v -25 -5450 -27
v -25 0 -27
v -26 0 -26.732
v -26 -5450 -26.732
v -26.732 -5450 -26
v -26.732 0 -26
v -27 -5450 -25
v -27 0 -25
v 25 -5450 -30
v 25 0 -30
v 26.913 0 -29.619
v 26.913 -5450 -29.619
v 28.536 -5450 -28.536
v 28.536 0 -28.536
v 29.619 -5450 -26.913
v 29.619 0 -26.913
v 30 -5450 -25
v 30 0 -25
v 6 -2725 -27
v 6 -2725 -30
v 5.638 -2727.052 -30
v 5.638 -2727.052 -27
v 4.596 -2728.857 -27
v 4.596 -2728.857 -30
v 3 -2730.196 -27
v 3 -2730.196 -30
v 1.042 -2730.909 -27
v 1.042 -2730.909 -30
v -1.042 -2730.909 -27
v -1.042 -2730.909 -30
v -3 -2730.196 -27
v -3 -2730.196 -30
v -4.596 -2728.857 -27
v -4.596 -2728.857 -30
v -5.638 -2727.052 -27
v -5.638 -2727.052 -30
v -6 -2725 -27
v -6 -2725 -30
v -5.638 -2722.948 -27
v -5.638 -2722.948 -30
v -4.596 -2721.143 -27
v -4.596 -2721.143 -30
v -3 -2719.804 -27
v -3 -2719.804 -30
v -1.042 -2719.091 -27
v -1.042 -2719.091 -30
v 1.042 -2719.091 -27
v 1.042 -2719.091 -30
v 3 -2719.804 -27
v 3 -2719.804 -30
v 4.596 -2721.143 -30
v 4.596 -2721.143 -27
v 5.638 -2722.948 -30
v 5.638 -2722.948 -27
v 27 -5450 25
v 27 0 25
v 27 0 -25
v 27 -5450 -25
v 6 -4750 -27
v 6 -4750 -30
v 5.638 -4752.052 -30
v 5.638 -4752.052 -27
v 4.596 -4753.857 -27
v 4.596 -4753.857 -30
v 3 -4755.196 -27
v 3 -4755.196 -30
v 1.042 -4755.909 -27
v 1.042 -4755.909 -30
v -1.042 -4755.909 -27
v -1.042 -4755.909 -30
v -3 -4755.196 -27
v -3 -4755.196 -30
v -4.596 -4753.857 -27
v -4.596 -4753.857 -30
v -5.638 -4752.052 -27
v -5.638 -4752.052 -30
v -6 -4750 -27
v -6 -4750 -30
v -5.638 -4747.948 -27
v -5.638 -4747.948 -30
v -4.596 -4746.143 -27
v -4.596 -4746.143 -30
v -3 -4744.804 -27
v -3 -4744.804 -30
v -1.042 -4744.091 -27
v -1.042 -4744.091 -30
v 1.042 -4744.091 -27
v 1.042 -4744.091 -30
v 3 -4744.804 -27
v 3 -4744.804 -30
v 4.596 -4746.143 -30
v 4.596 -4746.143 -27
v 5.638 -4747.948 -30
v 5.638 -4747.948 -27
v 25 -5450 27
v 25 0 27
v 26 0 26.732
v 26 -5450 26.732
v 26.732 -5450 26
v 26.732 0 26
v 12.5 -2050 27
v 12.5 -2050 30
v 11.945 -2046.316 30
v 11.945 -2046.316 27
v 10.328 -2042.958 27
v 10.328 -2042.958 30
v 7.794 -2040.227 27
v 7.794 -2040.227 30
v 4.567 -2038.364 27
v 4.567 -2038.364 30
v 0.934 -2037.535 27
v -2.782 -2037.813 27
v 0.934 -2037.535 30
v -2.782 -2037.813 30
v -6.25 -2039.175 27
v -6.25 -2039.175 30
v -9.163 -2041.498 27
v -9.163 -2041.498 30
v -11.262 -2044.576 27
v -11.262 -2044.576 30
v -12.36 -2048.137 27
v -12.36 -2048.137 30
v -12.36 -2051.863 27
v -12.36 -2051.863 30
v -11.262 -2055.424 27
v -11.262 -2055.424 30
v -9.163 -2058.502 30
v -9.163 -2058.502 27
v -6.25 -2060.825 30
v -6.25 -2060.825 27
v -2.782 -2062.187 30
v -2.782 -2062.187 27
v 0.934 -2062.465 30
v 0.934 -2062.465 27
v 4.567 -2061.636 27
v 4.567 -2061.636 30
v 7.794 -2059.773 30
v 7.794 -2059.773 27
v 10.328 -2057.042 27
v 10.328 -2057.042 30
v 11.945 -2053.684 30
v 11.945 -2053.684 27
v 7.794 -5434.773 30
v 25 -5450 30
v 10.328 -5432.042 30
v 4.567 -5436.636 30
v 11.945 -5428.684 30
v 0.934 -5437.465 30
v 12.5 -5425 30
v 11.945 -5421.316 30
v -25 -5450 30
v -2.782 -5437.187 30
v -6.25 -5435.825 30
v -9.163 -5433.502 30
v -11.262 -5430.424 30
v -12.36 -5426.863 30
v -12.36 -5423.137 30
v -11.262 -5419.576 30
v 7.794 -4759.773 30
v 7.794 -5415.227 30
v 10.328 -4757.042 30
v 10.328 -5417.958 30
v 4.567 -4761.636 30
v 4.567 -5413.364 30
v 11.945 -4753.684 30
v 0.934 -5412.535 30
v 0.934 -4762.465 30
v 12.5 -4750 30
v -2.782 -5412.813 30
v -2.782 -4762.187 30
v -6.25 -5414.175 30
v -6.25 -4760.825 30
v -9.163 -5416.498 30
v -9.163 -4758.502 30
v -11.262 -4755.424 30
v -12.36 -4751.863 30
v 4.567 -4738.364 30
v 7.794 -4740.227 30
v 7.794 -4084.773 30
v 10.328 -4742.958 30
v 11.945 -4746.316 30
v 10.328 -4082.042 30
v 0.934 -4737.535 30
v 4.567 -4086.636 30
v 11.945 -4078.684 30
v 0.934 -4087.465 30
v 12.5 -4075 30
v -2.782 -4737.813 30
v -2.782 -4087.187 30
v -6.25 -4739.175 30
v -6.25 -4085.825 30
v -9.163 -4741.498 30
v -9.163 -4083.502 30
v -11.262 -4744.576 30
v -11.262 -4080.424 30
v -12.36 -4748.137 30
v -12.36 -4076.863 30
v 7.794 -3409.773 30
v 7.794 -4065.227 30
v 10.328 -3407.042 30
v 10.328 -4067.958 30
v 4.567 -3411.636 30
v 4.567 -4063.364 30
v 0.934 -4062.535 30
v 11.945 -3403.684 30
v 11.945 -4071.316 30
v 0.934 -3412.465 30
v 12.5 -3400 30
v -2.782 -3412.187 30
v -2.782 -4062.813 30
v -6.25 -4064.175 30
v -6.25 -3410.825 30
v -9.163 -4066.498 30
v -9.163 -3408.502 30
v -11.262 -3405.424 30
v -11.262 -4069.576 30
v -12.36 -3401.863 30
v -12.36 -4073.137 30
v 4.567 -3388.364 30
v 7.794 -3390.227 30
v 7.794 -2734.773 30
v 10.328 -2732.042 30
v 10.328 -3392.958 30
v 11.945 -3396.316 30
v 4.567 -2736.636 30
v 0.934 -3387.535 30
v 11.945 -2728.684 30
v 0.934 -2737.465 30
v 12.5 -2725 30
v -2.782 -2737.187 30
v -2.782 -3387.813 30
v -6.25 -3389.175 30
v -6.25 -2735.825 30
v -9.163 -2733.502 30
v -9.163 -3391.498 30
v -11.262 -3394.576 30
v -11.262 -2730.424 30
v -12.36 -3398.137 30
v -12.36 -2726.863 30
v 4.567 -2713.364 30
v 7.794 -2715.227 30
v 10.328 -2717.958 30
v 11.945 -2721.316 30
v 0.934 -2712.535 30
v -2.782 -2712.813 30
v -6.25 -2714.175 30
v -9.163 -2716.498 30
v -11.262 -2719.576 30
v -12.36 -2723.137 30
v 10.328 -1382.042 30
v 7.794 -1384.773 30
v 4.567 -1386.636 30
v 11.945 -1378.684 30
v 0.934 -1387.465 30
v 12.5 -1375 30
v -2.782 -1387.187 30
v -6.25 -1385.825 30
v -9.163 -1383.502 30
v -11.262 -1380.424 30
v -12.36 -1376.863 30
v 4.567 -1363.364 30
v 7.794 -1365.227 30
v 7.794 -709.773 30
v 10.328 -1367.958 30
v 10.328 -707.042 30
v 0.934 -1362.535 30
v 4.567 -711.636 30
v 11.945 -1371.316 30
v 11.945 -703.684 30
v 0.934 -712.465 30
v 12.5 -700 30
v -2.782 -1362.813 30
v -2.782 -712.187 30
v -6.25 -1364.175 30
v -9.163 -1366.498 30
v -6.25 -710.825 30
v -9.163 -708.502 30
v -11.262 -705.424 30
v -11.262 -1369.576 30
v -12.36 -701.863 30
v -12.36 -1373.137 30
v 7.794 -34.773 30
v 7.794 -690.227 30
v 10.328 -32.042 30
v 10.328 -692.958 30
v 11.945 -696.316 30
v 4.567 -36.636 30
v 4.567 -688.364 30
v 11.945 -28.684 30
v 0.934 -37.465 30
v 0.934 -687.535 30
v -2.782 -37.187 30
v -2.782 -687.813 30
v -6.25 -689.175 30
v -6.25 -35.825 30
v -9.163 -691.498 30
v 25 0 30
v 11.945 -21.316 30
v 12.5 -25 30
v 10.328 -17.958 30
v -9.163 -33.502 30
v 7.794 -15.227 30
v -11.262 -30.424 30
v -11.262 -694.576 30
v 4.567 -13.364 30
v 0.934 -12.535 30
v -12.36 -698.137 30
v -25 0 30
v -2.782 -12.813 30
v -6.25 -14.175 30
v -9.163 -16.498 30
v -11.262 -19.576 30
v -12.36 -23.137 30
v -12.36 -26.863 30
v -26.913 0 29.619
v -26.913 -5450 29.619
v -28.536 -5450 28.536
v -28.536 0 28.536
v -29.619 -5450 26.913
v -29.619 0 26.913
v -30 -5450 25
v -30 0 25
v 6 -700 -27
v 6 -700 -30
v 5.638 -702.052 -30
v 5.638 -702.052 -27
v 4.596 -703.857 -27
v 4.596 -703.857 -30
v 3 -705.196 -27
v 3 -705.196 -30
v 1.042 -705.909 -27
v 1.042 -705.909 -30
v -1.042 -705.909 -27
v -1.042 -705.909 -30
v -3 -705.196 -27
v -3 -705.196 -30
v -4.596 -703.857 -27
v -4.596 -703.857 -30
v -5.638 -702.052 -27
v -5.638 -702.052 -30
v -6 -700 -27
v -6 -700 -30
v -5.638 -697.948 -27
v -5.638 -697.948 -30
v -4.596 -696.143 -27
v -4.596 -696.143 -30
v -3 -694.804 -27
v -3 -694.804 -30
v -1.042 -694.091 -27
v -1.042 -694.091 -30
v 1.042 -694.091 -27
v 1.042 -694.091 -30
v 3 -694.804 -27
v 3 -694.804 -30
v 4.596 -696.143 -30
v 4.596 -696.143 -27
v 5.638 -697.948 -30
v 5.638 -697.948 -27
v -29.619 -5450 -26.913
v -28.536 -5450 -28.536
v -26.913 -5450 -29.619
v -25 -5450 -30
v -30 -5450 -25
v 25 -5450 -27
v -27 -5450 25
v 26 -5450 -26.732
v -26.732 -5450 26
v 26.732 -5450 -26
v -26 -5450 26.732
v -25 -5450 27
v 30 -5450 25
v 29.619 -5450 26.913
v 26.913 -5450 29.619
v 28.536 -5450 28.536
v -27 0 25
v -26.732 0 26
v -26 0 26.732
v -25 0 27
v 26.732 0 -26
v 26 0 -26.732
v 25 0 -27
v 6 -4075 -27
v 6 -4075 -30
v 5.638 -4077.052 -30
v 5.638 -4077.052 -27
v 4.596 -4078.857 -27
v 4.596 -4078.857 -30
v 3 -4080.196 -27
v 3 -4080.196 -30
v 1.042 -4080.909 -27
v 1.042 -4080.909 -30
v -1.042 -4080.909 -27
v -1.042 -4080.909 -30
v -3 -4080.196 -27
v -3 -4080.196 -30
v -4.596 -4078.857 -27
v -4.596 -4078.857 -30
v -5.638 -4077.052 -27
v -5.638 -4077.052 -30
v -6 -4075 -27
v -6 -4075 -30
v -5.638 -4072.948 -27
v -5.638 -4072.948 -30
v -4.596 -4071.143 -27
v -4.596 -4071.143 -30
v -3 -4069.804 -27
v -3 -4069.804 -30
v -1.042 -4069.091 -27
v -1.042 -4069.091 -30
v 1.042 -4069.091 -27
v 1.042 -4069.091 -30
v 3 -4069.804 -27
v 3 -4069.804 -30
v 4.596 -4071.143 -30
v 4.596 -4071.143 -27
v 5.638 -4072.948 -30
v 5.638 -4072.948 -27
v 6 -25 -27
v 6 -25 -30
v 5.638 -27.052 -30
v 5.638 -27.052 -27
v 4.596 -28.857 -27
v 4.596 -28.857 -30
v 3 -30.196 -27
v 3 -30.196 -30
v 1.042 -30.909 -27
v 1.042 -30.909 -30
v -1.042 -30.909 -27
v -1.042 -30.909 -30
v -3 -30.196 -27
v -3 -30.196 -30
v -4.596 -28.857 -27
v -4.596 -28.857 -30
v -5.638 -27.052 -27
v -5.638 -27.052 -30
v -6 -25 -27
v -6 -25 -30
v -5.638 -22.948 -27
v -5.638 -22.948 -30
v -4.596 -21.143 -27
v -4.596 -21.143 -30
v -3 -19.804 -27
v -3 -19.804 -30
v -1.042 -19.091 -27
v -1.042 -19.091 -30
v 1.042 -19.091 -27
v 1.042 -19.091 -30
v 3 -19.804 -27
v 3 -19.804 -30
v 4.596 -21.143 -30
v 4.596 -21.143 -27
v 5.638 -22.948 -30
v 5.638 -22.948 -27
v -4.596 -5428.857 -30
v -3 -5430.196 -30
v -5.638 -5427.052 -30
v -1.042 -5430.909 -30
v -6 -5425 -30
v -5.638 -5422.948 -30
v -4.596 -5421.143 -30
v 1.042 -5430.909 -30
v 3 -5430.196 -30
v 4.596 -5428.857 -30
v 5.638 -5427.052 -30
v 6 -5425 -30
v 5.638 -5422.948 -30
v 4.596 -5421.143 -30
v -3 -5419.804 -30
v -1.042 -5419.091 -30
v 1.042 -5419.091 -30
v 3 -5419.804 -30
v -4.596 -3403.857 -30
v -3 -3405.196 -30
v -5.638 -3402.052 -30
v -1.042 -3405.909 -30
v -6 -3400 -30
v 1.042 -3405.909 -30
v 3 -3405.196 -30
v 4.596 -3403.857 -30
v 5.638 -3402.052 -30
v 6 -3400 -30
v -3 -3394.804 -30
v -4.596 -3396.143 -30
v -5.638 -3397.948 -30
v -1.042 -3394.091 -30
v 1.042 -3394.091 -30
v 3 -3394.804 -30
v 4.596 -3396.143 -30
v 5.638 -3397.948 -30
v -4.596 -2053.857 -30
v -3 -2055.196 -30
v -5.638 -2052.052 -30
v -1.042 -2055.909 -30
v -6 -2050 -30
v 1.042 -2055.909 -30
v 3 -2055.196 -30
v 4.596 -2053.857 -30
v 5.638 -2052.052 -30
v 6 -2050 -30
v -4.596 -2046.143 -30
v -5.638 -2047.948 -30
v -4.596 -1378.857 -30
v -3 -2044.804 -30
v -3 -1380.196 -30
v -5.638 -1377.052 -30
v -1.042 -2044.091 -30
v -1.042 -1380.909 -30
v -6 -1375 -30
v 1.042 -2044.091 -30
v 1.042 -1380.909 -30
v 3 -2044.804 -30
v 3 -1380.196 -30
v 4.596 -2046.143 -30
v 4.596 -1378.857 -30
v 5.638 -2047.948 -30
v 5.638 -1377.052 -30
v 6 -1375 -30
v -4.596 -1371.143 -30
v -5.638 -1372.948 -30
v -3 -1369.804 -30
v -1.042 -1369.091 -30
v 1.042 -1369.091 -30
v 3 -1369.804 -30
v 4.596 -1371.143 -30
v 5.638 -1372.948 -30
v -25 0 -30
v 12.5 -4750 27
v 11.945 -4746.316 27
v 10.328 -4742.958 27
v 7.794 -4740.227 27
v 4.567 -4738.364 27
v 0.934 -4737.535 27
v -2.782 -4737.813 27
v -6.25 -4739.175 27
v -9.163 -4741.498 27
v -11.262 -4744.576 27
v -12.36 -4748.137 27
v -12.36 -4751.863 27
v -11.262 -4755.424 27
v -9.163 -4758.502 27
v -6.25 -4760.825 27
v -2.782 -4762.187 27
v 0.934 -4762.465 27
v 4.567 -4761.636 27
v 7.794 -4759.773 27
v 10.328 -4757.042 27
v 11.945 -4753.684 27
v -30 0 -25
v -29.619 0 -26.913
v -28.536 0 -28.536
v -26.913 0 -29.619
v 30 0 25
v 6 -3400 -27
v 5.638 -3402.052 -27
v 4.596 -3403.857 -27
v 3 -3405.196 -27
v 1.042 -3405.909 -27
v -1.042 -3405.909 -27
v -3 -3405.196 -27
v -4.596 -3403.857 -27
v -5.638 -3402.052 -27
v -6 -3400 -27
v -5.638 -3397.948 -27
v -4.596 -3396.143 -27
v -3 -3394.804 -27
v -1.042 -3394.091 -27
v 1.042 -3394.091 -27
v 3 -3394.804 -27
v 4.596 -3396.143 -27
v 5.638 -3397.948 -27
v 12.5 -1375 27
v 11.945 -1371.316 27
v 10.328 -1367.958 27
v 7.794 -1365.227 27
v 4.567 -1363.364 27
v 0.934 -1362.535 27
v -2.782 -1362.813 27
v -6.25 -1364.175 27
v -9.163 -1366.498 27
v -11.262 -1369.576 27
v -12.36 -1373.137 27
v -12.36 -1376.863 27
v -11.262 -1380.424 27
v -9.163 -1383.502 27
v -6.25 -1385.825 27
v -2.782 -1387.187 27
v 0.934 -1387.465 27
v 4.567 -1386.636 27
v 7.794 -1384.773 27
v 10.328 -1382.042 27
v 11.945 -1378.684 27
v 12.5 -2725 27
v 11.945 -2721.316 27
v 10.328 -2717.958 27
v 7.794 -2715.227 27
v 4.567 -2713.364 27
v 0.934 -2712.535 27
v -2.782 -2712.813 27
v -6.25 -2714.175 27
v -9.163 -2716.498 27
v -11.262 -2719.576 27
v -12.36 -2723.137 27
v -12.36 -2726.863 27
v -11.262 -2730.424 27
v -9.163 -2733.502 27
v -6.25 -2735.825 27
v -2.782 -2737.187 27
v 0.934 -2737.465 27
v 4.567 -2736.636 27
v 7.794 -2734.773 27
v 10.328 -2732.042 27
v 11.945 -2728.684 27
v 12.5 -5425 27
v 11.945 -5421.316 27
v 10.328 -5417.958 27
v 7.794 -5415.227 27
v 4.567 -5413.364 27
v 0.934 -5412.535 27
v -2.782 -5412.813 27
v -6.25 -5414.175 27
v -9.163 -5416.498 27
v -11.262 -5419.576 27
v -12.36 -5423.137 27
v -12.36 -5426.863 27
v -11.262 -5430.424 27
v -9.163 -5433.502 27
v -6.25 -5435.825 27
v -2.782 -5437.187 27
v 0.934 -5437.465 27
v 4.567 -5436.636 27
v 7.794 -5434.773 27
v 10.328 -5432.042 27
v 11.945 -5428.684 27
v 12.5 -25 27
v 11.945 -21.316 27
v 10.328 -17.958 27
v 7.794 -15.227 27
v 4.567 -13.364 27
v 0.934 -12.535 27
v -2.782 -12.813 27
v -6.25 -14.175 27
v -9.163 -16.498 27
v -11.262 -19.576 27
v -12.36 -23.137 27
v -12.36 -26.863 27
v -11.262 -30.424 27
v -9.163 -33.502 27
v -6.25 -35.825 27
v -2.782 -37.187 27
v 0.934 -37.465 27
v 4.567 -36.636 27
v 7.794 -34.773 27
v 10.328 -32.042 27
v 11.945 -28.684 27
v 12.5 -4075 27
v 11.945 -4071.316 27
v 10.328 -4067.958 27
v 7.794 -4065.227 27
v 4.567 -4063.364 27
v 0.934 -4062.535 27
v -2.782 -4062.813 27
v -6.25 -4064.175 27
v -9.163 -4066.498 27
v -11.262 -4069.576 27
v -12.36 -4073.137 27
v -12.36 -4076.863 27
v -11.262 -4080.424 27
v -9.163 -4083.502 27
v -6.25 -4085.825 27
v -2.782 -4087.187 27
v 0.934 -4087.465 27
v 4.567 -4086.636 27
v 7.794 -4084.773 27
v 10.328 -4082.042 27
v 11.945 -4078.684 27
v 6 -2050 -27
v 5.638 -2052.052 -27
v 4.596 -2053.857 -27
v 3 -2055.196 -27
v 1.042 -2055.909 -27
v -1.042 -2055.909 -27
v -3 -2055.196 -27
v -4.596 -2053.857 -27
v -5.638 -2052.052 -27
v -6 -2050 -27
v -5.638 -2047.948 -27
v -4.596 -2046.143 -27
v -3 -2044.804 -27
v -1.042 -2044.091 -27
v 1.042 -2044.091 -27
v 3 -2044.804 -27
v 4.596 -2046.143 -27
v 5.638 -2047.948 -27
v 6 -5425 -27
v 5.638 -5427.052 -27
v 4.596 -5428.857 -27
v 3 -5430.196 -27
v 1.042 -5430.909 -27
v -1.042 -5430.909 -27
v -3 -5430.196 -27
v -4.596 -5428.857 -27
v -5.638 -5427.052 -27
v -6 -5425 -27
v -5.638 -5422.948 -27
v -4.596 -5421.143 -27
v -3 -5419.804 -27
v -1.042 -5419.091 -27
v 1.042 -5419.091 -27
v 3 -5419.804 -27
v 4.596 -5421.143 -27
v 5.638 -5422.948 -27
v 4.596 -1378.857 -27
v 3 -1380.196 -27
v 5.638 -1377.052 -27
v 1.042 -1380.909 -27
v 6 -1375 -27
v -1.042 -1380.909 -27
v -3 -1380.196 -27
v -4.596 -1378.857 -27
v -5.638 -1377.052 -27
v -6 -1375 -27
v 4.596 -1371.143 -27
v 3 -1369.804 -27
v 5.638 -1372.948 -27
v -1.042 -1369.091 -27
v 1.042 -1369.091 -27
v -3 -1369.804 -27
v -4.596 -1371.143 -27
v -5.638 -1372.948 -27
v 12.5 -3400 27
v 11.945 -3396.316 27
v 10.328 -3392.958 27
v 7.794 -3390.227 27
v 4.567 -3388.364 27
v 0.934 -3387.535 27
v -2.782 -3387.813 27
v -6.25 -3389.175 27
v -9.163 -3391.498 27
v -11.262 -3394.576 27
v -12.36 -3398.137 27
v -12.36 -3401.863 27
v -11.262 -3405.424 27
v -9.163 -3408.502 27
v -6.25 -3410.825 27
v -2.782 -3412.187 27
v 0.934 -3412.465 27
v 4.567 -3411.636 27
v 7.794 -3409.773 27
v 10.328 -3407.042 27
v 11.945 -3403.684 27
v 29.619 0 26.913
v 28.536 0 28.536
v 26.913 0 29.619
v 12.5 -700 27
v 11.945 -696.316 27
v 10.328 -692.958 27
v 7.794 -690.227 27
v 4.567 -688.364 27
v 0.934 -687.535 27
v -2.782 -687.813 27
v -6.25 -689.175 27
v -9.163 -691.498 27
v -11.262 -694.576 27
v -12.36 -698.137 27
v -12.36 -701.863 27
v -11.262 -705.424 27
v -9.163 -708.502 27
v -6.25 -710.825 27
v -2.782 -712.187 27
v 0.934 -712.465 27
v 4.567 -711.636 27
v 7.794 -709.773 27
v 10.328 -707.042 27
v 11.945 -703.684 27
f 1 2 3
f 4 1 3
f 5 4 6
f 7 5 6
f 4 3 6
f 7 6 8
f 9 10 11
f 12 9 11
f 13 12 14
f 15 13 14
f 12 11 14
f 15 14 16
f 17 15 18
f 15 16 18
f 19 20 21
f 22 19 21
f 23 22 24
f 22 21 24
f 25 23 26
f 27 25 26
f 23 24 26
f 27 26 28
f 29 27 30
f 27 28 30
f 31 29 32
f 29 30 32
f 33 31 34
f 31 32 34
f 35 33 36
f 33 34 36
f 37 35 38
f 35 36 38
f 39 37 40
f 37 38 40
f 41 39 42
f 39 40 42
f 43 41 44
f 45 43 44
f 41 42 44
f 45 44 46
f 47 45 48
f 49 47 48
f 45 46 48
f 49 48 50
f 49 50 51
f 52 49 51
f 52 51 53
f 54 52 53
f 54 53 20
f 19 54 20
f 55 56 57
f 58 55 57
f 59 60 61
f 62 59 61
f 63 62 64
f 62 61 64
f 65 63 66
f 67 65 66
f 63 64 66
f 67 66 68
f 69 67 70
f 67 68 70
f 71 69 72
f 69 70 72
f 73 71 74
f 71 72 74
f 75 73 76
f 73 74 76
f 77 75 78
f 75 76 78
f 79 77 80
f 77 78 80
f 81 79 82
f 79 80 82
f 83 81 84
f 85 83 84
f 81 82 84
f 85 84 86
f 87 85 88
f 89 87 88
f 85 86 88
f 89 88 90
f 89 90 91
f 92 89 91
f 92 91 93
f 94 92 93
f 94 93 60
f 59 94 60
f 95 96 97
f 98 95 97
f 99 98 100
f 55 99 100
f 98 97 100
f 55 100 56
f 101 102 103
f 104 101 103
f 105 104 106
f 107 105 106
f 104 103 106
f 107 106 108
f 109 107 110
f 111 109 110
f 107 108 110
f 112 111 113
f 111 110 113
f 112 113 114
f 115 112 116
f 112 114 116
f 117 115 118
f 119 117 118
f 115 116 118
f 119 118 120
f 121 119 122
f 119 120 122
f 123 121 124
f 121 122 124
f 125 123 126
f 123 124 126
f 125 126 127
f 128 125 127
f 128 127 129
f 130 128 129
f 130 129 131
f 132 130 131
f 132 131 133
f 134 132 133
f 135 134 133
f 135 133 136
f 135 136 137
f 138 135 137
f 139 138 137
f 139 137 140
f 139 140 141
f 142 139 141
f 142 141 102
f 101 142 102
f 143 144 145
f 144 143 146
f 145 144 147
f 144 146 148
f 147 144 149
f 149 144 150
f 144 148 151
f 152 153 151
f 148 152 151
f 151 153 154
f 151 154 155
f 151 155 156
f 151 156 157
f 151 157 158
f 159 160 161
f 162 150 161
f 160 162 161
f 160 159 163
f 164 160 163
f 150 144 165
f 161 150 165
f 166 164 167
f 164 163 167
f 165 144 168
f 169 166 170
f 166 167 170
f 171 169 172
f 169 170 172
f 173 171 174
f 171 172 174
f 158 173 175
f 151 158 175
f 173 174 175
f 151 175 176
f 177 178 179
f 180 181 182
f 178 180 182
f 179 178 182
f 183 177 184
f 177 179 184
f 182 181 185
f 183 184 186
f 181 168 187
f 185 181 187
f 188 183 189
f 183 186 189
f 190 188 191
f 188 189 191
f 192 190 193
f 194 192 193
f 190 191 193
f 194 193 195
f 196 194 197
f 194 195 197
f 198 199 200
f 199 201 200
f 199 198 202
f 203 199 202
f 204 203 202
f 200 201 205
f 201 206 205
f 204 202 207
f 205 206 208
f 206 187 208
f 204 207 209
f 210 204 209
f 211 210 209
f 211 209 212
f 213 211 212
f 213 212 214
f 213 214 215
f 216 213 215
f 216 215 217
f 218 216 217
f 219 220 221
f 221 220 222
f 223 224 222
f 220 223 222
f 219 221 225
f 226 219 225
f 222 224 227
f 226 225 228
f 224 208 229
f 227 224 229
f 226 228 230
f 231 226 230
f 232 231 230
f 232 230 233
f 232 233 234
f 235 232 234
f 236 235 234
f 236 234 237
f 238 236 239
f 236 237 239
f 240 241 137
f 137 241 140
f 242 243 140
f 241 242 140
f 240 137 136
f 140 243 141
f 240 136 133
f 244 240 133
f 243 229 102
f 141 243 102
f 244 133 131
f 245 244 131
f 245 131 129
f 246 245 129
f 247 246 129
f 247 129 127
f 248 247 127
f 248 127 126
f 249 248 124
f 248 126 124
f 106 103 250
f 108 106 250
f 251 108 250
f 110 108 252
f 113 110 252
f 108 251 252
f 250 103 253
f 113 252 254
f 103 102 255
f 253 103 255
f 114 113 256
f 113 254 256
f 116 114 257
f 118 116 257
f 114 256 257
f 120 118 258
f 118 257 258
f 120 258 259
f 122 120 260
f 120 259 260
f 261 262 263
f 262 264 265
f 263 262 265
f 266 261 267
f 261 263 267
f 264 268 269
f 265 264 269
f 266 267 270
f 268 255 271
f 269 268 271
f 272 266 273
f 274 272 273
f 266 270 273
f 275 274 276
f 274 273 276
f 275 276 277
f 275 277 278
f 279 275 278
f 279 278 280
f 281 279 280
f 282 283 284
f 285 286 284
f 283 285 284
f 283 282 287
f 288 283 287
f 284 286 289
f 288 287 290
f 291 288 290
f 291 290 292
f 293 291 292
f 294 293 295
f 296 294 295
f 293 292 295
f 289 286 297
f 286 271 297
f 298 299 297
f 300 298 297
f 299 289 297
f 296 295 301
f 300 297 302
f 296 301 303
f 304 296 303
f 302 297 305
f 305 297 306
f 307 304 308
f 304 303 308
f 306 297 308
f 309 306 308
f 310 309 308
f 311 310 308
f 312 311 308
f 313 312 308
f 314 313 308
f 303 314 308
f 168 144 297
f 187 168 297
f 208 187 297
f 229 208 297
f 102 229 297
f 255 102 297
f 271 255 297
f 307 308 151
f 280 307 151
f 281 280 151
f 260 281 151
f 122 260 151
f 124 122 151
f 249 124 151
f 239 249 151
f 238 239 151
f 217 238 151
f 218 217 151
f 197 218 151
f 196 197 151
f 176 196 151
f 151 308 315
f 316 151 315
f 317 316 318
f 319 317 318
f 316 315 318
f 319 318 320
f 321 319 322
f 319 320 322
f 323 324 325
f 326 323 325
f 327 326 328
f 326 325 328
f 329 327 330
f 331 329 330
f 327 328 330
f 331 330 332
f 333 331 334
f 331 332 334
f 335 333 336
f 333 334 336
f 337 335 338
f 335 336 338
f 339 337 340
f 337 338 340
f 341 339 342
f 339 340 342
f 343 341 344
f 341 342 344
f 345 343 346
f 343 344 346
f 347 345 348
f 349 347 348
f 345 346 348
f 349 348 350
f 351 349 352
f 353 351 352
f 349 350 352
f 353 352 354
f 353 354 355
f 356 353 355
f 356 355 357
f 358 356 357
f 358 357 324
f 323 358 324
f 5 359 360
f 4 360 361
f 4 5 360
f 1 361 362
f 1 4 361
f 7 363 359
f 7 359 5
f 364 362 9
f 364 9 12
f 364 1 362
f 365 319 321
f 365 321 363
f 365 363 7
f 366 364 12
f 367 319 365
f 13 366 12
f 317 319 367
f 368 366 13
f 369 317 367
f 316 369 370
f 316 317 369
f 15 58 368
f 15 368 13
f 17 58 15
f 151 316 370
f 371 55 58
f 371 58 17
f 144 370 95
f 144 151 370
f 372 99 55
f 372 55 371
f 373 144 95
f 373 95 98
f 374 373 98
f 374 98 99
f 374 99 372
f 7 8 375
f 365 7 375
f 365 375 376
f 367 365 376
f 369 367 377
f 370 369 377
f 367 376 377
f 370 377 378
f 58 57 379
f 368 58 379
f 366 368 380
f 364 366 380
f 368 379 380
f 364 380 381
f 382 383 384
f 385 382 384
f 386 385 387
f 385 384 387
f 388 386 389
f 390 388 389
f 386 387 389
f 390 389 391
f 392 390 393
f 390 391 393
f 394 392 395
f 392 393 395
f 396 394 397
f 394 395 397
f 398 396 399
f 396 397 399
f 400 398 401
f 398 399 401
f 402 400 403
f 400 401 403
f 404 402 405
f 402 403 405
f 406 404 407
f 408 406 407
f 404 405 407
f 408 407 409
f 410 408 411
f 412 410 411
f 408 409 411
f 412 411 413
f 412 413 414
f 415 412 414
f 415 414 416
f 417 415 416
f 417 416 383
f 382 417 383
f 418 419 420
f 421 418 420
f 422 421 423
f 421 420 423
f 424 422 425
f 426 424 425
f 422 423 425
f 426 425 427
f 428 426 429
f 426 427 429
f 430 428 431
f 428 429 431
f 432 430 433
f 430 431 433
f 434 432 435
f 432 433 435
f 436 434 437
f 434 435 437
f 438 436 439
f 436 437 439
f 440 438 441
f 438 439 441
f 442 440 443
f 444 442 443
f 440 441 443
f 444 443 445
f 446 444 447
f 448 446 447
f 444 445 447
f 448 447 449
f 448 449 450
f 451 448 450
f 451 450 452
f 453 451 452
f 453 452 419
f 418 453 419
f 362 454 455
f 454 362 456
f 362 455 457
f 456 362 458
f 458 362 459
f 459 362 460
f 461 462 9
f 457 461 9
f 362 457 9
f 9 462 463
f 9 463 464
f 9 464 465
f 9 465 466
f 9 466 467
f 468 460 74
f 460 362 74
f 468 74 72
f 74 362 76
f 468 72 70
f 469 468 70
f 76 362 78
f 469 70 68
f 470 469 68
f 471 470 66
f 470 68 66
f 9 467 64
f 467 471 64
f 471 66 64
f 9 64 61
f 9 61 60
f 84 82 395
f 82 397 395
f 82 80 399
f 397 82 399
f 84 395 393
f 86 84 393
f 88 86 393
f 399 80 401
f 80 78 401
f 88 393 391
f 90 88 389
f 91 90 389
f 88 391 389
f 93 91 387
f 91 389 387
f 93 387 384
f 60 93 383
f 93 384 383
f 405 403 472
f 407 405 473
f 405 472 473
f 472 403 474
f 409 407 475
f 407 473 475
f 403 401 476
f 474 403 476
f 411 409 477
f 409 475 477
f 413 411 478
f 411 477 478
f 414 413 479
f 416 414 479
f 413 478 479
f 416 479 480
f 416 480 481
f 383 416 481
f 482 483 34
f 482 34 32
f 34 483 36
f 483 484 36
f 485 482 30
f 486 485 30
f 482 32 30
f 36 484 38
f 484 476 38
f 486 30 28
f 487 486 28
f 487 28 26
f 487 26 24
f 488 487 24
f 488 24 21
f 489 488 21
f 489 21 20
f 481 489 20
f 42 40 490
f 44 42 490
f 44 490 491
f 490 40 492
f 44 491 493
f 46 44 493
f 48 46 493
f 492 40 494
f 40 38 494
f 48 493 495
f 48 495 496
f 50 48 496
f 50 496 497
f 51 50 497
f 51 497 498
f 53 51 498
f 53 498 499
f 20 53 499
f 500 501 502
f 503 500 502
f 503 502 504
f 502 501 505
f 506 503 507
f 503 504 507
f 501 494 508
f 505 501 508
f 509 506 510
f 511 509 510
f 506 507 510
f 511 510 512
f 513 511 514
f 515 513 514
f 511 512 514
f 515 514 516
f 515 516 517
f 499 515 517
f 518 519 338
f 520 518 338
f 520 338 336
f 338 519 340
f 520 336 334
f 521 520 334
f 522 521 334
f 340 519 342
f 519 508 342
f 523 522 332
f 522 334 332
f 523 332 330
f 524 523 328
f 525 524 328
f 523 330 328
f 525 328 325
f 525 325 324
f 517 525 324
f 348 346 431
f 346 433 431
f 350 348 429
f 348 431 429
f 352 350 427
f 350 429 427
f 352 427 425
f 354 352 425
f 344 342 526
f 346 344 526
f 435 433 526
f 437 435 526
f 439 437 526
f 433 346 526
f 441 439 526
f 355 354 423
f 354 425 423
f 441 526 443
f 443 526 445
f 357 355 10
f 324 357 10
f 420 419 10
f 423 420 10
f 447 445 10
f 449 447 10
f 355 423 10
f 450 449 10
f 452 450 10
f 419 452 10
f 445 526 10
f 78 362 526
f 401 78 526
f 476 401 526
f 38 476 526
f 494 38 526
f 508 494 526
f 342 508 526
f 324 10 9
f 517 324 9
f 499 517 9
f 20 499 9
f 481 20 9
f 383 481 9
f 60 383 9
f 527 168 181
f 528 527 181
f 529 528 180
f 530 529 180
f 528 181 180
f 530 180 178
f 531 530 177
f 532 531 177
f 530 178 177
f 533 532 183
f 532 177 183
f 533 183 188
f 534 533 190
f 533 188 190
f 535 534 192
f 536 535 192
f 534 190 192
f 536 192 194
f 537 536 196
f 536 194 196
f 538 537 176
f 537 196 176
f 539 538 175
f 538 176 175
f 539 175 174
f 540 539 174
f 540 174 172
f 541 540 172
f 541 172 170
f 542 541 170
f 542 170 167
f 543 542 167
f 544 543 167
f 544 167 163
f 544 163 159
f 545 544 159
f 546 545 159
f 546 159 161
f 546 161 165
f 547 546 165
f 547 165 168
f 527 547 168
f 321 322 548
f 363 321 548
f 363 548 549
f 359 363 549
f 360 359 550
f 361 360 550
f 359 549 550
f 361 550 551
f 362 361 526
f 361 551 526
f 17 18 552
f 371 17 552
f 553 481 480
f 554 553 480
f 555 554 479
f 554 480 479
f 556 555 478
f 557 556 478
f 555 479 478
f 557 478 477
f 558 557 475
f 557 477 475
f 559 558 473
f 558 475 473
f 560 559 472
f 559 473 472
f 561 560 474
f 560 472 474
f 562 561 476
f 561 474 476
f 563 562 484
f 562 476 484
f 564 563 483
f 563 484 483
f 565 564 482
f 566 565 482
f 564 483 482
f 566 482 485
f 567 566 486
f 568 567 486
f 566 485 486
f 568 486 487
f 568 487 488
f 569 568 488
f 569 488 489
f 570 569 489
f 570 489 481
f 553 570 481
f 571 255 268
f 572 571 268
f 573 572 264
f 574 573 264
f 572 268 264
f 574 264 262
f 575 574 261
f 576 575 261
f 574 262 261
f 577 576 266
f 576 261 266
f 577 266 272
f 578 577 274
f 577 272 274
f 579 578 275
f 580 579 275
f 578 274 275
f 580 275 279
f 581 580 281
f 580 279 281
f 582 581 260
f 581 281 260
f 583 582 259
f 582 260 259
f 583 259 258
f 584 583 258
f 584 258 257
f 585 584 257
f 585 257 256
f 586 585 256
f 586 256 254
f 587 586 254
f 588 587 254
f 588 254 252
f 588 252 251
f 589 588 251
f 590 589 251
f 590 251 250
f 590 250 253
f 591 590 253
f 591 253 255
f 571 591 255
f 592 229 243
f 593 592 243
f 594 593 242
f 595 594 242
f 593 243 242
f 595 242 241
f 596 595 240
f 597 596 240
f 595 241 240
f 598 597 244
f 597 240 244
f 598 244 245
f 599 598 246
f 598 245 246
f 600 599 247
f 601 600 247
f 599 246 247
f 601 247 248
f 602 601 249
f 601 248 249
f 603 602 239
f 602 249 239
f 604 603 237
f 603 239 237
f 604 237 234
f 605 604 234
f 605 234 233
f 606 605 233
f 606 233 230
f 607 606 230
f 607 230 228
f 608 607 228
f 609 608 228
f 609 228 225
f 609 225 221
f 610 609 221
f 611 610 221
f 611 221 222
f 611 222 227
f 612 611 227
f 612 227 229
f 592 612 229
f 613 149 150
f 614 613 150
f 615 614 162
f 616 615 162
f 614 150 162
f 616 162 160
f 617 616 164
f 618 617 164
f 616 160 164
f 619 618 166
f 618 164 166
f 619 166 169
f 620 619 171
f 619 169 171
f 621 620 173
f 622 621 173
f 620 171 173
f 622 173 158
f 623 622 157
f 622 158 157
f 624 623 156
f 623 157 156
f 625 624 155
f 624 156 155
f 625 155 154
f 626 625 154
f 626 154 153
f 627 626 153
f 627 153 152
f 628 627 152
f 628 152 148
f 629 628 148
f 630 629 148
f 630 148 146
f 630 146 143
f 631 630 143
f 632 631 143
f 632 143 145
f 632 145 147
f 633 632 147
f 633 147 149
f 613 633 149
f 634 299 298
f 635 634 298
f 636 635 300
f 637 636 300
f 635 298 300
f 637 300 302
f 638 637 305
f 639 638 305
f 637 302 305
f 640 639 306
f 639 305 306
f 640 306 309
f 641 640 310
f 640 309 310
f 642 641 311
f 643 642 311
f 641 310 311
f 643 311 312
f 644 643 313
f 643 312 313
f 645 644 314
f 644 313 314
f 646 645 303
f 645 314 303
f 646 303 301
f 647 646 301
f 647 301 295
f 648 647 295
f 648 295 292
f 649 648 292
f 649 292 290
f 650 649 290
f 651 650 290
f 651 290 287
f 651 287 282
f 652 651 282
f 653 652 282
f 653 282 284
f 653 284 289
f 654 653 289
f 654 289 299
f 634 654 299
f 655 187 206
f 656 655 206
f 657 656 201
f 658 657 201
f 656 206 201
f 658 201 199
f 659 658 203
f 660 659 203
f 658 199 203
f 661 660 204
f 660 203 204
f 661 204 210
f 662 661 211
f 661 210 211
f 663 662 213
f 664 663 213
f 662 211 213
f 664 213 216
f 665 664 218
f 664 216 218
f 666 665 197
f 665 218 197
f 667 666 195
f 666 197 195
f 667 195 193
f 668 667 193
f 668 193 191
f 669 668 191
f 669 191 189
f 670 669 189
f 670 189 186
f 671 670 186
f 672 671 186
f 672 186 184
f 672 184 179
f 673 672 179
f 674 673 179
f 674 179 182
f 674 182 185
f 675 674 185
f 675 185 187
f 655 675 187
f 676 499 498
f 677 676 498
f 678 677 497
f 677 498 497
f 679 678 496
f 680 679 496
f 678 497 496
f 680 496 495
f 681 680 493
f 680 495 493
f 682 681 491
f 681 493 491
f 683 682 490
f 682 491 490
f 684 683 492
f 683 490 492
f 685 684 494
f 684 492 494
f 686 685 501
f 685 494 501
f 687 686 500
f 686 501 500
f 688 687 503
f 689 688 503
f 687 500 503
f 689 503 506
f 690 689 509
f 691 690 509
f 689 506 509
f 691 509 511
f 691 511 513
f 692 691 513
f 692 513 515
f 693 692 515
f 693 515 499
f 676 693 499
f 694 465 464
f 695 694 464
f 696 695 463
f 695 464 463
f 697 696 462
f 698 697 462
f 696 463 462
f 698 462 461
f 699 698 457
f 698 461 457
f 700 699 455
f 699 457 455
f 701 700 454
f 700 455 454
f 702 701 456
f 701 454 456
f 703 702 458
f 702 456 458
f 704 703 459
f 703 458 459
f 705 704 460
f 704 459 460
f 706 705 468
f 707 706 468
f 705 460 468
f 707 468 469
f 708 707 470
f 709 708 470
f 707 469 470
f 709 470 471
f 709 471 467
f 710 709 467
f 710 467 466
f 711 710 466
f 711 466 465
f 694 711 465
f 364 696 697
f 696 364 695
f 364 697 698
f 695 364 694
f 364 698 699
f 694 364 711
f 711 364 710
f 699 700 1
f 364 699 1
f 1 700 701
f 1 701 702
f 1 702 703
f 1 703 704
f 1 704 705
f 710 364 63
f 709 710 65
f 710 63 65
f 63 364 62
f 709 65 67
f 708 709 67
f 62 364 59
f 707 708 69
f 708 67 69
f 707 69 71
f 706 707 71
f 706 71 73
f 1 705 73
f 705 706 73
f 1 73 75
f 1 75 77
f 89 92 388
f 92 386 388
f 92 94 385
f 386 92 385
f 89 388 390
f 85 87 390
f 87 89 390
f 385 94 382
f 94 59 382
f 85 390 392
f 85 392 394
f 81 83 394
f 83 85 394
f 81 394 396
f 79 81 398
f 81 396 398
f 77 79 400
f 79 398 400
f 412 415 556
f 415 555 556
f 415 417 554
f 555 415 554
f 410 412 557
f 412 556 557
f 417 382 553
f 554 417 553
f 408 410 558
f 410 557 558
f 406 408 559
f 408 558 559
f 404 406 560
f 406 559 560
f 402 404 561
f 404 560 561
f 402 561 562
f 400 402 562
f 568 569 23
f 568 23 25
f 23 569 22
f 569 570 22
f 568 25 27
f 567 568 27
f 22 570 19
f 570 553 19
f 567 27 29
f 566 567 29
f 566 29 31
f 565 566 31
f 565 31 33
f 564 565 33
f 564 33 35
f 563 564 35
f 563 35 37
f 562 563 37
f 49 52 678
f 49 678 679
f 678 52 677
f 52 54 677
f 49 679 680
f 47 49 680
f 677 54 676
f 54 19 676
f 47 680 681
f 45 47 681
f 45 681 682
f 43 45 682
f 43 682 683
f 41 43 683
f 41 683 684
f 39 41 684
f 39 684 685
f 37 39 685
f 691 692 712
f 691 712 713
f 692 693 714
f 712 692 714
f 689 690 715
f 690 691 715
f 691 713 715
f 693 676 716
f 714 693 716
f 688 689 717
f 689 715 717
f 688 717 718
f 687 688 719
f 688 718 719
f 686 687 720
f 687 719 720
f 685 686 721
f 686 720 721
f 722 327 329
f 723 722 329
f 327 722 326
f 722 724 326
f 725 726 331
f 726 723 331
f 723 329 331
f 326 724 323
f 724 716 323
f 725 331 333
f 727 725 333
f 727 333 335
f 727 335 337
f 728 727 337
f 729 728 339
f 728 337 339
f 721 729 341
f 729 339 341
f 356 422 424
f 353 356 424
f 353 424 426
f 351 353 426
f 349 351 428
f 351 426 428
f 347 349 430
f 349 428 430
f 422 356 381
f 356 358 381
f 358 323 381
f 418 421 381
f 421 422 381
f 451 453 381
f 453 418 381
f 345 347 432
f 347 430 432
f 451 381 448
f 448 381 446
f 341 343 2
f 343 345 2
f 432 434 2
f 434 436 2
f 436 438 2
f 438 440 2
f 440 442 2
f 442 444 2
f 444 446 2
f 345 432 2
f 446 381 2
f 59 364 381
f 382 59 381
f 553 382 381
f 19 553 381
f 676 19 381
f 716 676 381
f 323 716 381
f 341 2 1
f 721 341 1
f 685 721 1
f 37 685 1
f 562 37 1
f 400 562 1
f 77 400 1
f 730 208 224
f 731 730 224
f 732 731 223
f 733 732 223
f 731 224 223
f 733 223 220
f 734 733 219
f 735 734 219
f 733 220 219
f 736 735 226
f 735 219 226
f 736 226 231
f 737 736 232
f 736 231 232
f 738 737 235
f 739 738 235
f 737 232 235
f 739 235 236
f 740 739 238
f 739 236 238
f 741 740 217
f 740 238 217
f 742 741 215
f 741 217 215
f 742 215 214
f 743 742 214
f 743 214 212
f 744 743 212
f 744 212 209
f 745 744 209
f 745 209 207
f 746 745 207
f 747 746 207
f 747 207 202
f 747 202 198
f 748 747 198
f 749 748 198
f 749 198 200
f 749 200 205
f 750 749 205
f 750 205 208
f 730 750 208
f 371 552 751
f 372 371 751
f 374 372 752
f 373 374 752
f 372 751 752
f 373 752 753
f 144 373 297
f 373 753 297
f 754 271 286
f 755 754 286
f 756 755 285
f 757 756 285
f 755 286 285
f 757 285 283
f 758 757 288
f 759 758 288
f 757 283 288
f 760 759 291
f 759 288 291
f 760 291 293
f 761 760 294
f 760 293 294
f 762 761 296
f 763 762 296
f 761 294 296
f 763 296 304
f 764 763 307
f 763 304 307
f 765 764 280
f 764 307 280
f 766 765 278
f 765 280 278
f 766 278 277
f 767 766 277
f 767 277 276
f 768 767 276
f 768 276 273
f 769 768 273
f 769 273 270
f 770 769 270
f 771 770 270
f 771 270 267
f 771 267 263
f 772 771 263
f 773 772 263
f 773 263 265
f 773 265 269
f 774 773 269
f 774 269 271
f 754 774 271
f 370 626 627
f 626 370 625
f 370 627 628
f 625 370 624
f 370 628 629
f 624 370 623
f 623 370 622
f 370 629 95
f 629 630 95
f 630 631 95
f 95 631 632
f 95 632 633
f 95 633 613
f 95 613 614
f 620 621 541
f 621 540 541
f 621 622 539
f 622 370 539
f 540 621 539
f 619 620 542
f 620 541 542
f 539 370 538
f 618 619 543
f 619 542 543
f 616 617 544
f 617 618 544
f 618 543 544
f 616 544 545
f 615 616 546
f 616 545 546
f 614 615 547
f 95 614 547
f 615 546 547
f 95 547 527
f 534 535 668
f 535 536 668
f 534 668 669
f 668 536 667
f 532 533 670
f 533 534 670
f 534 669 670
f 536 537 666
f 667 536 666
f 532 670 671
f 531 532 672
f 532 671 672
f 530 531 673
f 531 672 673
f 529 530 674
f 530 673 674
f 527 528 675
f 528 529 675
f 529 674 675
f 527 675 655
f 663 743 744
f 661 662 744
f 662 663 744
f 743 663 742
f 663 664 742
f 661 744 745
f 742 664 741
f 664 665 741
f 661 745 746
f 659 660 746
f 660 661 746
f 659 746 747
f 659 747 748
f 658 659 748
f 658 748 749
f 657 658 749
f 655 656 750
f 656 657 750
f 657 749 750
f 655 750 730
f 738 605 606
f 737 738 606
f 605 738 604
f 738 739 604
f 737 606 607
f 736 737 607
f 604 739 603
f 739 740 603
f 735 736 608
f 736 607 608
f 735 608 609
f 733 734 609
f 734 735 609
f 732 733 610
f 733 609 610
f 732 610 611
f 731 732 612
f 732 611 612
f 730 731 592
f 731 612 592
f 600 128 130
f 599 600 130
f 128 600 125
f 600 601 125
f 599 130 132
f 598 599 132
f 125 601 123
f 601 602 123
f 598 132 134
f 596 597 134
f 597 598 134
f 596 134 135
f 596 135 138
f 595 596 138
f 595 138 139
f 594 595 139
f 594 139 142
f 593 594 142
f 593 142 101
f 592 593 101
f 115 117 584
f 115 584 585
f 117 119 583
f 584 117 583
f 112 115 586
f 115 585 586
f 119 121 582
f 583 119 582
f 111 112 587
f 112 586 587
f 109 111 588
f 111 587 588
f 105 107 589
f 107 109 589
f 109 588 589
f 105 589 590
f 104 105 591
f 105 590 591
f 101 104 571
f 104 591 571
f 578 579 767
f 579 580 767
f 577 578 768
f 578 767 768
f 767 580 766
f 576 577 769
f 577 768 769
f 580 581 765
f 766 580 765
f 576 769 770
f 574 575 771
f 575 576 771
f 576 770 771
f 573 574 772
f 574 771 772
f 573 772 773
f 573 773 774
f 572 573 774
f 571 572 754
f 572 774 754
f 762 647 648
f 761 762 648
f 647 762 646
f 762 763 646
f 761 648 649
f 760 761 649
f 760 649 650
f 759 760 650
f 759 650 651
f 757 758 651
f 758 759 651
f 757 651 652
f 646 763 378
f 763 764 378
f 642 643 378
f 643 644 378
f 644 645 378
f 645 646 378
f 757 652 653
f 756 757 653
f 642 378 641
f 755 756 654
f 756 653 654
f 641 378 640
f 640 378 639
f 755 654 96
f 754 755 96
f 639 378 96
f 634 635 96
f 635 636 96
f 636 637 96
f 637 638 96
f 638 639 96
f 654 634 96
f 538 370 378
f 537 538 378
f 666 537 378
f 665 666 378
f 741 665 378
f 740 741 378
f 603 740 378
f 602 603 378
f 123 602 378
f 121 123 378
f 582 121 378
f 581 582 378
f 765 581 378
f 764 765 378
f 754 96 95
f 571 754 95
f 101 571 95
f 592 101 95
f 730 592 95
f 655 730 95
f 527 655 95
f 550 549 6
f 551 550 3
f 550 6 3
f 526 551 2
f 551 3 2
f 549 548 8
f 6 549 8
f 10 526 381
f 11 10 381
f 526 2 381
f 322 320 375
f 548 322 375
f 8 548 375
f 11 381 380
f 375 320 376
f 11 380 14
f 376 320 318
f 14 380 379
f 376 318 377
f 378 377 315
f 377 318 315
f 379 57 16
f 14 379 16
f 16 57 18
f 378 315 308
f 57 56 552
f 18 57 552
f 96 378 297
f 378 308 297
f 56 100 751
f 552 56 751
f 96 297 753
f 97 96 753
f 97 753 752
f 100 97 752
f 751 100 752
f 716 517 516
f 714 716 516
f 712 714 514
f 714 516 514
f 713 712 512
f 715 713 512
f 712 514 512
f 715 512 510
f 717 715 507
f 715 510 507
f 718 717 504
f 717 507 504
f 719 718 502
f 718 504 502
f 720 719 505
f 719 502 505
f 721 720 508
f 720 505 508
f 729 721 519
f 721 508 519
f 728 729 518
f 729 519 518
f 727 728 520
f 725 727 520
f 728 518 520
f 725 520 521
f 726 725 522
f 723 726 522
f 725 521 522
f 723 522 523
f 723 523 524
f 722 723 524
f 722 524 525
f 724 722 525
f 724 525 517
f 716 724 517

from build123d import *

# Parameters (mm, degrees)
F1_DEPTH = 5450
F2_R     = 12.5
F3_DEPTH = 4
F4_R     = 6
F5_DEPTH = 4


with BuildPart() as f1:
    # F0 (on Front) → F1 (new body)
    with BuildSketch(Plane.XZ):
        with BuildLine():
            Line((25, 30), (-25, 30))
            ThreePointArc((-25, 30), (-28.535534, 28.535534), (-30, 25))
            Line((-30, 25), (-30, -25))
            ThreePointArc((-30, -25), (-28.535534, -28.535534), (-25, -30))
            Line((-25, -30), (25, -30))
            ThreePointArc((25, -30), (28.535534, -28.535534), (30, -25))
            Line((30, -25), (30, 25))
            ThreePointArc((30, 25), (28.535534, 28.535534), (25, 30))
        make_face()
        with BuildLine():
            Line((-27, -25), (-27, 25))
            ThreePointArc((-27, 25), (-26.414214, 26.414214), (-25, 27))
            Line((-25, 27), (25, 27))
            ThreePointArc((25, 27), (26.414214, 26.414214), (27, 25))
            Line((27, 25), (27, -25))
            ThreePointArc((27, -25), (26.414214, -26.414214), (25, -27))
            Line((25, -27), (-25, -27))
            ThreePointArc((-25, -27), (-26.414214, -26.414214), (-27, -25))
        make_face(mode=Mode.SUBTRACT)
    extrude(amount=F1_DEPTH)

    # F2 (on face) → F3 (cut)
    with BuildSketch(Plane.XY.offset(30)):
        with Locations((0, -5425)):
            Circle(F2_R)
        with Locations((0, -4750)):
            Circle(F2_R)
        with Locations((0, -4075)):
            Circle(F2_R)
        with Locations((0, -3400)):
            Circle(F2_R)
        with Locations((0, -2725)):
            Circle(F2_R)
        with Locations((0, -2050)):
            Circle(F2_R)
        with Locations((0, -1375)):
            Circle(F2_R)
        with Locations((0, -700)):
            Circle(F2_R)
        with Locations((0, -25)):
            Circle(F2_R)
    extrude(amount=-F3_DEPTH, mode=Mode.SUBTRACT)

    # F4 (on face) → F5 (cut)
    with BuildSketch(Plane(origin=(0, 0, -30), x_dir=(1, 0, 0), z_dir=(0, 0, -1))):
        with Locations((0, 25)):
            Circle(F4_R)
        with Locations((0, 700)):
            Circle(F4_R)
        with Locations((0, 1375)):
            Circle(F4_R)
        with Locations((0, 2050)):
            Circle(F4_R)
        with Locations((0, 2725)):
            Circle(F4_R)
        with Locations((0, 3400)):
            Circle(F4_R)
        with Locations((0, 4075)):
            Circle(F4_R)
        with Locations((0, 4750)):
            Circle(F4_R)
        with Locations((0, 5425)):
            Circle(F4_R)
    extrude(amount=-F5_DEPTH, mode=Mode.SUBTRACT)


solid = f1.part
